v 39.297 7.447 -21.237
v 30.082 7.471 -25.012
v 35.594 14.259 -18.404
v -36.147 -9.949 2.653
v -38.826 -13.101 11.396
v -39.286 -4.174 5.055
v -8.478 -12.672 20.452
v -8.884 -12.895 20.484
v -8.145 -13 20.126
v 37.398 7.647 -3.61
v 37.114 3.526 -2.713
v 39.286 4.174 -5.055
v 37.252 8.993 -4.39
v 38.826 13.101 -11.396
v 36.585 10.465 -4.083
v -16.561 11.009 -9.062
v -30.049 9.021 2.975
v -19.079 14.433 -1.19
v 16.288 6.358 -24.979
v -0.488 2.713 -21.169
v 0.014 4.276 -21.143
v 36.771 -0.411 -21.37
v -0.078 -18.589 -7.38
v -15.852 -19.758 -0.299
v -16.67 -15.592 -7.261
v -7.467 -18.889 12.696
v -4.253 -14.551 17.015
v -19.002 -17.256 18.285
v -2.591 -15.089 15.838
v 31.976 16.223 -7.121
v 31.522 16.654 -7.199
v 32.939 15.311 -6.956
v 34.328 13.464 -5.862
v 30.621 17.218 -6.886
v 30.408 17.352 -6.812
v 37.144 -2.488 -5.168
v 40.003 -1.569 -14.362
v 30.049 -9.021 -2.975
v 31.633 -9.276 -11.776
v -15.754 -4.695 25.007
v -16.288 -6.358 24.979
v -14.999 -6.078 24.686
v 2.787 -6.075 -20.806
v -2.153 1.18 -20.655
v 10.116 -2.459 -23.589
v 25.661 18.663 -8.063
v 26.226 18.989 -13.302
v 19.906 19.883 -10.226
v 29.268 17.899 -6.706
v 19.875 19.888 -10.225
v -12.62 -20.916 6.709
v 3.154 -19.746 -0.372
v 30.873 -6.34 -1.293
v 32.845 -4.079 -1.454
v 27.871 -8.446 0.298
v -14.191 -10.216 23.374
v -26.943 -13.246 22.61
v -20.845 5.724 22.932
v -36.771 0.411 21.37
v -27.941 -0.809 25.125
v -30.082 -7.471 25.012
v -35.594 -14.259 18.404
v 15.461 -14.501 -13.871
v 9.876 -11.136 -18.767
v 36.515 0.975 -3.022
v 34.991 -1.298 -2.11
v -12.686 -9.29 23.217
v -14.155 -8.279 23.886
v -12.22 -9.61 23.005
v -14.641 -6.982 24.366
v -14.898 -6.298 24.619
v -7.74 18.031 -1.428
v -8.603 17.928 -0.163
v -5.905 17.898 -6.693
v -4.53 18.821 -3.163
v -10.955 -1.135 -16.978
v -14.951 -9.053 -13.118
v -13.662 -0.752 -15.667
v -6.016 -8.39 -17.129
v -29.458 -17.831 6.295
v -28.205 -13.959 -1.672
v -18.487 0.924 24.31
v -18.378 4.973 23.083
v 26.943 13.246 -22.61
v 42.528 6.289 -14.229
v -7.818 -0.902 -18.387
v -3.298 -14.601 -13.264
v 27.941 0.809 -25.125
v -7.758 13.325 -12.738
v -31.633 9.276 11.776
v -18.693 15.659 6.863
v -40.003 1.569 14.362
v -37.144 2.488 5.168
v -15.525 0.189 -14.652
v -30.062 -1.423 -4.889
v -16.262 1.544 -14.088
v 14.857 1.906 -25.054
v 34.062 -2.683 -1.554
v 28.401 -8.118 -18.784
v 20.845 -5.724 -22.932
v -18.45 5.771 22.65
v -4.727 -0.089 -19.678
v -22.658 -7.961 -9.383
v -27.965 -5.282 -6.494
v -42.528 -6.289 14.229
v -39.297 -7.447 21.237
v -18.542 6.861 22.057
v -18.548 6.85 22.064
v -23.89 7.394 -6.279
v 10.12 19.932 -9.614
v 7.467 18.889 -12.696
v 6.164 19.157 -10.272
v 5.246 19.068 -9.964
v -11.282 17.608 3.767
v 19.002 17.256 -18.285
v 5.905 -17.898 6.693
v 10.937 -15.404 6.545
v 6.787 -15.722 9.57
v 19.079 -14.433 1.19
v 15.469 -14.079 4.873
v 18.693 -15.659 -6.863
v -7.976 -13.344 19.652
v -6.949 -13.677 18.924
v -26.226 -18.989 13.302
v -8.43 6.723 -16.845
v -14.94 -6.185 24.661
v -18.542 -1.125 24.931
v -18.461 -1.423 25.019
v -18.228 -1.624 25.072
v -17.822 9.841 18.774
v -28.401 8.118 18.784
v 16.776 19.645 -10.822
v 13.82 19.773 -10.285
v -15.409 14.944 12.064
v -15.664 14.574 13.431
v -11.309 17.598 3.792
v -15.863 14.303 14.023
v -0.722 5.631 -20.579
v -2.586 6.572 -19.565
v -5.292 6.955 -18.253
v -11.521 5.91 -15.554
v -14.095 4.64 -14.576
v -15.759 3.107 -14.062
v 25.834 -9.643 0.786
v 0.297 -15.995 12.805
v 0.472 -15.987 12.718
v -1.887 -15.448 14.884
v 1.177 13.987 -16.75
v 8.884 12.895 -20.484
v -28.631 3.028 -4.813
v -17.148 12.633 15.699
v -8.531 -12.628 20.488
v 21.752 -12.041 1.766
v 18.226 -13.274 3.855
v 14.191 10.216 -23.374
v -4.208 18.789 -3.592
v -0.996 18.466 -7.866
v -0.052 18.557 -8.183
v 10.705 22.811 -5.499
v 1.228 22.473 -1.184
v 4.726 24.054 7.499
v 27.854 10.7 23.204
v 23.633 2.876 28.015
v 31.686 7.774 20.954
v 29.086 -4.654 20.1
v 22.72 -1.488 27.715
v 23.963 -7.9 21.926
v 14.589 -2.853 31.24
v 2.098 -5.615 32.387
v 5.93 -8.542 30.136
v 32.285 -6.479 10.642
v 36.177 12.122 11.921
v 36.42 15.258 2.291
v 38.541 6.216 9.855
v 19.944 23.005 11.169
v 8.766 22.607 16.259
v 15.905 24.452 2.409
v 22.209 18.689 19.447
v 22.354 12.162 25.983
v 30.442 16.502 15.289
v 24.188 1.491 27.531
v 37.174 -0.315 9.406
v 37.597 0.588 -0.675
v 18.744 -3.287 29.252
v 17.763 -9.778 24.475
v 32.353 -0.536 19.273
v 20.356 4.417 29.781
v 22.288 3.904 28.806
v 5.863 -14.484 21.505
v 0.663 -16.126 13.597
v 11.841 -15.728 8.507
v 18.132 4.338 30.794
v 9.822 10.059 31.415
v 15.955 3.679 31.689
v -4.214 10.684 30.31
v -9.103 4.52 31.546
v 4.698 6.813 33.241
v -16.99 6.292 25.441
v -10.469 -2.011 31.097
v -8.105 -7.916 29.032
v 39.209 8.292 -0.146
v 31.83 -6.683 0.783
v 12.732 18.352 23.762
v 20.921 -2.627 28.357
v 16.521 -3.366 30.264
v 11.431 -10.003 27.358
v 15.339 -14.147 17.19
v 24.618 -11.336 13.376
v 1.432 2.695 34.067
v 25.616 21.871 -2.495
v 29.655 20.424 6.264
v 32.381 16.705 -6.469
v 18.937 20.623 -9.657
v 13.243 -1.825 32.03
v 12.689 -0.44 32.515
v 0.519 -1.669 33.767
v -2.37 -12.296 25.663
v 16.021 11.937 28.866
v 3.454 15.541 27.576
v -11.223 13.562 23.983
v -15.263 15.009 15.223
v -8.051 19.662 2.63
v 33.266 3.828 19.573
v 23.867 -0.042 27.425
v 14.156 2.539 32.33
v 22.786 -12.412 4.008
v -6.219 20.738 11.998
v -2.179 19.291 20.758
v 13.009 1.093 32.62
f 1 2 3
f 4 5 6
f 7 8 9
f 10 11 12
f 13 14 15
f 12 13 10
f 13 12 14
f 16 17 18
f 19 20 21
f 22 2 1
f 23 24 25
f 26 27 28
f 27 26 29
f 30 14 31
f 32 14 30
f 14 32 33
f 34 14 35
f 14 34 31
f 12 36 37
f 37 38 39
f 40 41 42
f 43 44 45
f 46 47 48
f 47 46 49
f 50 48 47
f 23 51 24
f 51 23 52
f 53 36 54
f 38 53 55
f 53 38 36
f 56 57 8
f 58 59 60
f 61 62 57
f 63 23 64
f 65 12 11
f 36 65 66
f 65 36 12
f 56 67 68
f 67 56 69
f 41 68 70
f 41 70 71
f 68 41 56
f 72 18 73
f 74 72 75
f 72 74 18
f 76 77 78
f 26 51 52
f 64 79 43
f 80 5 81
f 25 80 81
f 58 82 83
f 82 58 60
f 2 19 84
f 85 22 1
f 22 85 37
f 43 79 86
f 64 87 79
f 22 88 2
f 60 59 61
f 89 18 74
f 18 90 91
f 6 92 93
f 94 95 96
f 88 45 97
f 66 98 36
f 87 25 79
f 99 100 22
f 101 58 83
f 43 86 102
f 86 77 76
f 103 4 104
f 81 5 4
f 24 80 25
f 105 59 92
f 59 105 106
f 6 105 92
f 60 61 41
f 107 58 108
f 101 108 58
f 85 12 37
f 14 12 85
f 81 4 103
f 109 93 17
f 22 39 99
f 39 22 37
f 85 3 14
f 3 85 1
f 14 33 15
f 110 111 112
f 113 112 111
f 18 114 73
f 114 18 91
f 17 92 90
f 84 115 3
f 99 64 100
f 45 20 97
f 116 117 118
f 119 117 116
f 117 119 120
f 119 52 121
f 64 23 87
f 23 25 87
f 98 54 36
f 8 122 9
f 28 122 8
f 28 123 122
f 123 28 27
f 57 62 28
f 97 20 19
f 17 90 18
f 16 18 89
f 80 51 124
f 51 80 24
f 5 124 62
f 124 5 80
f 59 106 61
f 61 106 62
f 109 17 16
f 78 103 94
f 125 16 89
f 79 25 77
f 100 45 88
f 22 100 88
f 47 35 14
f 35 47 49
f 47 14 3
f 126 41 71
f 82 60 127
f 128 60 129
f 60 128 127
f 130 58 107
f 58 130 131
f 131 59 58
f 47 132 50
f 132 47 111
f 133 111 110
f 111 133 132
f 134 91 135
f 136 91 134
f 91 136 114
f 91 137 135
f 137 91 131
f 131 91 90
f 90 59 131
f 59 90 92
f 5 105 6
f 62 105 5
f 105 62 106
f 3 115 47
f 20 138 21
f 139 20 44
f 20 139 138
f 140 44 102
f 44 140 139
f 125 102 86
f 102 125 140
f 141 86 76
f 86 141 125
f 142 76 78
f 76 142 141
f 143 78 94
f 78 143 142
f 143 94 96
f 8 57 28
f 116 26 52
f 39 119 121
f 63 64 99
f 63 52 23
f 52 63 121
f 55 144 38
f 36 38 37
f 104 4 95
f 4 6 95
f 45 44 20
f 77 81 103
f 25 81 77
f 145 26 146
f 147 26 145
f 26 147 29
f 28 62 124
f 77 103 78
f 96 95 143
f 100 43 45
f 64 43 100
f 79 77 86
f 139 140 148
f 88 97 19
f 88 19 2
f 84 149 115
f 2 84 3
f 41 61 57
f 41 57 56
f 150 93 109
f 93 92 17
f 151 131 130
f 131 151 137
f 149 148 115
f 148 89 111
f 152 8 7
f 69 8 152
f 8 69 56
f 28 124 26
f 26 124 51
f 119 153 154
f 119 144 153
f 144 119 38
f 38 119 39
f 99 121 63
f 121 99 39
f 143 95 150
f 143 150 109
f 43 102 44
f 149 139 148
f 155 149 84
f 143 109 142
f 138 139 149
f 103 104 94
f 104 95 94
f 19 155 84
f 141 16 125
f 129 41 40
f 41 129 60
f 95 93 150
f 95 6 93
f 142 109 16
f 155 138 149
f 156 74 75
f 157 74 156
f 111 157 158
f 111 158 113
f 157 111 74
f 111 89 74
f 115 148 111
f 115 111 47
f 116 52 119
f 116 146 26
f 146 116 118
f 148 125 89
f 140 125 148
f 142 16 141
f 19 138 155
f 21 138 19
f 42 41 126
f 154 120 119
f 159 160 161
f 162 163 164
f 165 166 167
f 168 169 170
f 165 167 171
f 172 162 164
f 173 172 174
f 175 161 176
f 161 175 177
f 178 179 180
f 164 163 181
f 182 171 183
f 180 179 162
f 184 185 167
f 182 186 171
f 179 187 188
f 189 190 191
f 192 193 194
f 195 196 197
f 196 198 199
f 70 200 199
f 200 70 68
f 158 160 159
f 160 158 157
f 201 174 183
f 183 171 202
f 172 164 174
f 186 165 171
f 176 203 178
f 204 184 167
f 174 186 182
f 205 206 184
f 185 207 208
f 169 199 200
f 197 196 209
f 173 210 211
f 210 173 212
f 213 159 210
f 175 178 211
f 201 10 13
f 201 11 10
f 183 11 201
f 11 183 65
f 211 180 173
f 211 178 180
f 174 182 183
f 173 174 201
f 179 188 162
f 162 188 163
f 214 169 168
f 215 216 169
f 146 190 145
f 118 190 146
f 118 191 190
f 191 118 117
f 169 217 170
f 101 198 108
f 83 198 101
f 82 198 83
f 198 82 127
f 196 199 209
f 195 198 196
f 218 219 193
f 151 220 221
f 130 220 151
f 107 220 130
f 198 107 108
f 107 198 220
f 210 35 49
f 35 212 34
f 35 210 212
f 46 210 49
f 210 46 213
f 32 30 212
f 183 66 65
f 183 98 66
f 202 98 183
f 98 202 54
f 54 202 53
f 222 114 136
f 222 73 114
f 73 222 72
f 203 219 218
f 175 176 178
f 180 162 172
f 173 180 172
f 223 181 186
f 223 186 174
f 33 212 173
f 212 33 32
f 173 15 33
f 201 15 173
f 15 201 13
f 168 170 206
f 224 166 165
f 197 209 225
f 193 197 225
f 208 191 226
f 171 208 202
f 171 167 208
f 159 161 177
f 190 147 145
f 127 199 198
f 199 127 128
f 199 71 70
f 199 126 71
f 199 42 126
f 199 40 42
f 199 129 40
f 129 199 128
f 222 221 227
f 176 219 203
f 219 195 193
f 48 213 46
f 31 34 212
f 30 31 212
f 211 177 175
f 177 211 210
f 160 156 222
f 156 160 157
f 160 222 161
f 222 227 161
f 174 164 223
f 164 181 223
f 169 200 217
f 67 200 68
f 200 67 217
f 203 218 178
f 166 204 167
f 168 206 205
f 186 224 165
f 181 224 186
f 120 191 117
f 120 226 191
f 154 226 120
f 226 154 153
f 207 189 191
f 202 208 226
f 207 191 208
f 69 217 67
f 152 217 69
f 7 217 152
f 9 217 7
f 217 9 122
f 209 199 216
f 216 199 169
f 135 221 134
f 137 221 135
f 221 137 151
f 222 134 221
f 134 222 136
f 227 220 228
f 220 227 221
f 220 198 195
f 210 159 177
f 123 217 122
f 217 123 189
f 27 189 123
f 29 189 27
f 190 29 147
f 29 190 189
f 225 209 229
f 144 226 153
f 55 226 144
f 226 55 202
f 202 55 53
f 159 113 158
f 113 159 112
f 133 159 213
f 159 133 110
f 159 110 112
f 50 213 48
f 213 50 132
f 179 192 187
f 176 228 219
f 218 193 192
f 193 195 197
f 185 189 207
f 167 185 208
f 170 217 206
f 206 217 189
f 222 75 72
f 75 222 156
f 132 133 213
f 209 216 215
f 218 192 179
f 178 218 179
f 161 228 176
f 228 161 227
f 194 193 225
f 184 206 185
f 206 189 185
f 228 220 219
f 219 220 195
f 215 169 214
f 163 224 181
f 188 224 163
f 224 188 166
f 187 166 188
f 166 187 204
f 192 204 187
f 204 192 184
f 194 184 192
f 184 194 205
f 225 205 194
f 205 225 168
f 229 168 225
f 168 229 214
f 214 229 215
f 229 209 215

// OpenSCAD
$fn=16;

rotate(a = 27, v = [0.3, 0.7, 0.2])
union() {
scale(v = [2.3, 1, 1])
	sphere(r = 20);
translate(v = [5, 5, 10])
	scale(v = [1.3, 0.8, 1])
		sphere(r = 25);
}
